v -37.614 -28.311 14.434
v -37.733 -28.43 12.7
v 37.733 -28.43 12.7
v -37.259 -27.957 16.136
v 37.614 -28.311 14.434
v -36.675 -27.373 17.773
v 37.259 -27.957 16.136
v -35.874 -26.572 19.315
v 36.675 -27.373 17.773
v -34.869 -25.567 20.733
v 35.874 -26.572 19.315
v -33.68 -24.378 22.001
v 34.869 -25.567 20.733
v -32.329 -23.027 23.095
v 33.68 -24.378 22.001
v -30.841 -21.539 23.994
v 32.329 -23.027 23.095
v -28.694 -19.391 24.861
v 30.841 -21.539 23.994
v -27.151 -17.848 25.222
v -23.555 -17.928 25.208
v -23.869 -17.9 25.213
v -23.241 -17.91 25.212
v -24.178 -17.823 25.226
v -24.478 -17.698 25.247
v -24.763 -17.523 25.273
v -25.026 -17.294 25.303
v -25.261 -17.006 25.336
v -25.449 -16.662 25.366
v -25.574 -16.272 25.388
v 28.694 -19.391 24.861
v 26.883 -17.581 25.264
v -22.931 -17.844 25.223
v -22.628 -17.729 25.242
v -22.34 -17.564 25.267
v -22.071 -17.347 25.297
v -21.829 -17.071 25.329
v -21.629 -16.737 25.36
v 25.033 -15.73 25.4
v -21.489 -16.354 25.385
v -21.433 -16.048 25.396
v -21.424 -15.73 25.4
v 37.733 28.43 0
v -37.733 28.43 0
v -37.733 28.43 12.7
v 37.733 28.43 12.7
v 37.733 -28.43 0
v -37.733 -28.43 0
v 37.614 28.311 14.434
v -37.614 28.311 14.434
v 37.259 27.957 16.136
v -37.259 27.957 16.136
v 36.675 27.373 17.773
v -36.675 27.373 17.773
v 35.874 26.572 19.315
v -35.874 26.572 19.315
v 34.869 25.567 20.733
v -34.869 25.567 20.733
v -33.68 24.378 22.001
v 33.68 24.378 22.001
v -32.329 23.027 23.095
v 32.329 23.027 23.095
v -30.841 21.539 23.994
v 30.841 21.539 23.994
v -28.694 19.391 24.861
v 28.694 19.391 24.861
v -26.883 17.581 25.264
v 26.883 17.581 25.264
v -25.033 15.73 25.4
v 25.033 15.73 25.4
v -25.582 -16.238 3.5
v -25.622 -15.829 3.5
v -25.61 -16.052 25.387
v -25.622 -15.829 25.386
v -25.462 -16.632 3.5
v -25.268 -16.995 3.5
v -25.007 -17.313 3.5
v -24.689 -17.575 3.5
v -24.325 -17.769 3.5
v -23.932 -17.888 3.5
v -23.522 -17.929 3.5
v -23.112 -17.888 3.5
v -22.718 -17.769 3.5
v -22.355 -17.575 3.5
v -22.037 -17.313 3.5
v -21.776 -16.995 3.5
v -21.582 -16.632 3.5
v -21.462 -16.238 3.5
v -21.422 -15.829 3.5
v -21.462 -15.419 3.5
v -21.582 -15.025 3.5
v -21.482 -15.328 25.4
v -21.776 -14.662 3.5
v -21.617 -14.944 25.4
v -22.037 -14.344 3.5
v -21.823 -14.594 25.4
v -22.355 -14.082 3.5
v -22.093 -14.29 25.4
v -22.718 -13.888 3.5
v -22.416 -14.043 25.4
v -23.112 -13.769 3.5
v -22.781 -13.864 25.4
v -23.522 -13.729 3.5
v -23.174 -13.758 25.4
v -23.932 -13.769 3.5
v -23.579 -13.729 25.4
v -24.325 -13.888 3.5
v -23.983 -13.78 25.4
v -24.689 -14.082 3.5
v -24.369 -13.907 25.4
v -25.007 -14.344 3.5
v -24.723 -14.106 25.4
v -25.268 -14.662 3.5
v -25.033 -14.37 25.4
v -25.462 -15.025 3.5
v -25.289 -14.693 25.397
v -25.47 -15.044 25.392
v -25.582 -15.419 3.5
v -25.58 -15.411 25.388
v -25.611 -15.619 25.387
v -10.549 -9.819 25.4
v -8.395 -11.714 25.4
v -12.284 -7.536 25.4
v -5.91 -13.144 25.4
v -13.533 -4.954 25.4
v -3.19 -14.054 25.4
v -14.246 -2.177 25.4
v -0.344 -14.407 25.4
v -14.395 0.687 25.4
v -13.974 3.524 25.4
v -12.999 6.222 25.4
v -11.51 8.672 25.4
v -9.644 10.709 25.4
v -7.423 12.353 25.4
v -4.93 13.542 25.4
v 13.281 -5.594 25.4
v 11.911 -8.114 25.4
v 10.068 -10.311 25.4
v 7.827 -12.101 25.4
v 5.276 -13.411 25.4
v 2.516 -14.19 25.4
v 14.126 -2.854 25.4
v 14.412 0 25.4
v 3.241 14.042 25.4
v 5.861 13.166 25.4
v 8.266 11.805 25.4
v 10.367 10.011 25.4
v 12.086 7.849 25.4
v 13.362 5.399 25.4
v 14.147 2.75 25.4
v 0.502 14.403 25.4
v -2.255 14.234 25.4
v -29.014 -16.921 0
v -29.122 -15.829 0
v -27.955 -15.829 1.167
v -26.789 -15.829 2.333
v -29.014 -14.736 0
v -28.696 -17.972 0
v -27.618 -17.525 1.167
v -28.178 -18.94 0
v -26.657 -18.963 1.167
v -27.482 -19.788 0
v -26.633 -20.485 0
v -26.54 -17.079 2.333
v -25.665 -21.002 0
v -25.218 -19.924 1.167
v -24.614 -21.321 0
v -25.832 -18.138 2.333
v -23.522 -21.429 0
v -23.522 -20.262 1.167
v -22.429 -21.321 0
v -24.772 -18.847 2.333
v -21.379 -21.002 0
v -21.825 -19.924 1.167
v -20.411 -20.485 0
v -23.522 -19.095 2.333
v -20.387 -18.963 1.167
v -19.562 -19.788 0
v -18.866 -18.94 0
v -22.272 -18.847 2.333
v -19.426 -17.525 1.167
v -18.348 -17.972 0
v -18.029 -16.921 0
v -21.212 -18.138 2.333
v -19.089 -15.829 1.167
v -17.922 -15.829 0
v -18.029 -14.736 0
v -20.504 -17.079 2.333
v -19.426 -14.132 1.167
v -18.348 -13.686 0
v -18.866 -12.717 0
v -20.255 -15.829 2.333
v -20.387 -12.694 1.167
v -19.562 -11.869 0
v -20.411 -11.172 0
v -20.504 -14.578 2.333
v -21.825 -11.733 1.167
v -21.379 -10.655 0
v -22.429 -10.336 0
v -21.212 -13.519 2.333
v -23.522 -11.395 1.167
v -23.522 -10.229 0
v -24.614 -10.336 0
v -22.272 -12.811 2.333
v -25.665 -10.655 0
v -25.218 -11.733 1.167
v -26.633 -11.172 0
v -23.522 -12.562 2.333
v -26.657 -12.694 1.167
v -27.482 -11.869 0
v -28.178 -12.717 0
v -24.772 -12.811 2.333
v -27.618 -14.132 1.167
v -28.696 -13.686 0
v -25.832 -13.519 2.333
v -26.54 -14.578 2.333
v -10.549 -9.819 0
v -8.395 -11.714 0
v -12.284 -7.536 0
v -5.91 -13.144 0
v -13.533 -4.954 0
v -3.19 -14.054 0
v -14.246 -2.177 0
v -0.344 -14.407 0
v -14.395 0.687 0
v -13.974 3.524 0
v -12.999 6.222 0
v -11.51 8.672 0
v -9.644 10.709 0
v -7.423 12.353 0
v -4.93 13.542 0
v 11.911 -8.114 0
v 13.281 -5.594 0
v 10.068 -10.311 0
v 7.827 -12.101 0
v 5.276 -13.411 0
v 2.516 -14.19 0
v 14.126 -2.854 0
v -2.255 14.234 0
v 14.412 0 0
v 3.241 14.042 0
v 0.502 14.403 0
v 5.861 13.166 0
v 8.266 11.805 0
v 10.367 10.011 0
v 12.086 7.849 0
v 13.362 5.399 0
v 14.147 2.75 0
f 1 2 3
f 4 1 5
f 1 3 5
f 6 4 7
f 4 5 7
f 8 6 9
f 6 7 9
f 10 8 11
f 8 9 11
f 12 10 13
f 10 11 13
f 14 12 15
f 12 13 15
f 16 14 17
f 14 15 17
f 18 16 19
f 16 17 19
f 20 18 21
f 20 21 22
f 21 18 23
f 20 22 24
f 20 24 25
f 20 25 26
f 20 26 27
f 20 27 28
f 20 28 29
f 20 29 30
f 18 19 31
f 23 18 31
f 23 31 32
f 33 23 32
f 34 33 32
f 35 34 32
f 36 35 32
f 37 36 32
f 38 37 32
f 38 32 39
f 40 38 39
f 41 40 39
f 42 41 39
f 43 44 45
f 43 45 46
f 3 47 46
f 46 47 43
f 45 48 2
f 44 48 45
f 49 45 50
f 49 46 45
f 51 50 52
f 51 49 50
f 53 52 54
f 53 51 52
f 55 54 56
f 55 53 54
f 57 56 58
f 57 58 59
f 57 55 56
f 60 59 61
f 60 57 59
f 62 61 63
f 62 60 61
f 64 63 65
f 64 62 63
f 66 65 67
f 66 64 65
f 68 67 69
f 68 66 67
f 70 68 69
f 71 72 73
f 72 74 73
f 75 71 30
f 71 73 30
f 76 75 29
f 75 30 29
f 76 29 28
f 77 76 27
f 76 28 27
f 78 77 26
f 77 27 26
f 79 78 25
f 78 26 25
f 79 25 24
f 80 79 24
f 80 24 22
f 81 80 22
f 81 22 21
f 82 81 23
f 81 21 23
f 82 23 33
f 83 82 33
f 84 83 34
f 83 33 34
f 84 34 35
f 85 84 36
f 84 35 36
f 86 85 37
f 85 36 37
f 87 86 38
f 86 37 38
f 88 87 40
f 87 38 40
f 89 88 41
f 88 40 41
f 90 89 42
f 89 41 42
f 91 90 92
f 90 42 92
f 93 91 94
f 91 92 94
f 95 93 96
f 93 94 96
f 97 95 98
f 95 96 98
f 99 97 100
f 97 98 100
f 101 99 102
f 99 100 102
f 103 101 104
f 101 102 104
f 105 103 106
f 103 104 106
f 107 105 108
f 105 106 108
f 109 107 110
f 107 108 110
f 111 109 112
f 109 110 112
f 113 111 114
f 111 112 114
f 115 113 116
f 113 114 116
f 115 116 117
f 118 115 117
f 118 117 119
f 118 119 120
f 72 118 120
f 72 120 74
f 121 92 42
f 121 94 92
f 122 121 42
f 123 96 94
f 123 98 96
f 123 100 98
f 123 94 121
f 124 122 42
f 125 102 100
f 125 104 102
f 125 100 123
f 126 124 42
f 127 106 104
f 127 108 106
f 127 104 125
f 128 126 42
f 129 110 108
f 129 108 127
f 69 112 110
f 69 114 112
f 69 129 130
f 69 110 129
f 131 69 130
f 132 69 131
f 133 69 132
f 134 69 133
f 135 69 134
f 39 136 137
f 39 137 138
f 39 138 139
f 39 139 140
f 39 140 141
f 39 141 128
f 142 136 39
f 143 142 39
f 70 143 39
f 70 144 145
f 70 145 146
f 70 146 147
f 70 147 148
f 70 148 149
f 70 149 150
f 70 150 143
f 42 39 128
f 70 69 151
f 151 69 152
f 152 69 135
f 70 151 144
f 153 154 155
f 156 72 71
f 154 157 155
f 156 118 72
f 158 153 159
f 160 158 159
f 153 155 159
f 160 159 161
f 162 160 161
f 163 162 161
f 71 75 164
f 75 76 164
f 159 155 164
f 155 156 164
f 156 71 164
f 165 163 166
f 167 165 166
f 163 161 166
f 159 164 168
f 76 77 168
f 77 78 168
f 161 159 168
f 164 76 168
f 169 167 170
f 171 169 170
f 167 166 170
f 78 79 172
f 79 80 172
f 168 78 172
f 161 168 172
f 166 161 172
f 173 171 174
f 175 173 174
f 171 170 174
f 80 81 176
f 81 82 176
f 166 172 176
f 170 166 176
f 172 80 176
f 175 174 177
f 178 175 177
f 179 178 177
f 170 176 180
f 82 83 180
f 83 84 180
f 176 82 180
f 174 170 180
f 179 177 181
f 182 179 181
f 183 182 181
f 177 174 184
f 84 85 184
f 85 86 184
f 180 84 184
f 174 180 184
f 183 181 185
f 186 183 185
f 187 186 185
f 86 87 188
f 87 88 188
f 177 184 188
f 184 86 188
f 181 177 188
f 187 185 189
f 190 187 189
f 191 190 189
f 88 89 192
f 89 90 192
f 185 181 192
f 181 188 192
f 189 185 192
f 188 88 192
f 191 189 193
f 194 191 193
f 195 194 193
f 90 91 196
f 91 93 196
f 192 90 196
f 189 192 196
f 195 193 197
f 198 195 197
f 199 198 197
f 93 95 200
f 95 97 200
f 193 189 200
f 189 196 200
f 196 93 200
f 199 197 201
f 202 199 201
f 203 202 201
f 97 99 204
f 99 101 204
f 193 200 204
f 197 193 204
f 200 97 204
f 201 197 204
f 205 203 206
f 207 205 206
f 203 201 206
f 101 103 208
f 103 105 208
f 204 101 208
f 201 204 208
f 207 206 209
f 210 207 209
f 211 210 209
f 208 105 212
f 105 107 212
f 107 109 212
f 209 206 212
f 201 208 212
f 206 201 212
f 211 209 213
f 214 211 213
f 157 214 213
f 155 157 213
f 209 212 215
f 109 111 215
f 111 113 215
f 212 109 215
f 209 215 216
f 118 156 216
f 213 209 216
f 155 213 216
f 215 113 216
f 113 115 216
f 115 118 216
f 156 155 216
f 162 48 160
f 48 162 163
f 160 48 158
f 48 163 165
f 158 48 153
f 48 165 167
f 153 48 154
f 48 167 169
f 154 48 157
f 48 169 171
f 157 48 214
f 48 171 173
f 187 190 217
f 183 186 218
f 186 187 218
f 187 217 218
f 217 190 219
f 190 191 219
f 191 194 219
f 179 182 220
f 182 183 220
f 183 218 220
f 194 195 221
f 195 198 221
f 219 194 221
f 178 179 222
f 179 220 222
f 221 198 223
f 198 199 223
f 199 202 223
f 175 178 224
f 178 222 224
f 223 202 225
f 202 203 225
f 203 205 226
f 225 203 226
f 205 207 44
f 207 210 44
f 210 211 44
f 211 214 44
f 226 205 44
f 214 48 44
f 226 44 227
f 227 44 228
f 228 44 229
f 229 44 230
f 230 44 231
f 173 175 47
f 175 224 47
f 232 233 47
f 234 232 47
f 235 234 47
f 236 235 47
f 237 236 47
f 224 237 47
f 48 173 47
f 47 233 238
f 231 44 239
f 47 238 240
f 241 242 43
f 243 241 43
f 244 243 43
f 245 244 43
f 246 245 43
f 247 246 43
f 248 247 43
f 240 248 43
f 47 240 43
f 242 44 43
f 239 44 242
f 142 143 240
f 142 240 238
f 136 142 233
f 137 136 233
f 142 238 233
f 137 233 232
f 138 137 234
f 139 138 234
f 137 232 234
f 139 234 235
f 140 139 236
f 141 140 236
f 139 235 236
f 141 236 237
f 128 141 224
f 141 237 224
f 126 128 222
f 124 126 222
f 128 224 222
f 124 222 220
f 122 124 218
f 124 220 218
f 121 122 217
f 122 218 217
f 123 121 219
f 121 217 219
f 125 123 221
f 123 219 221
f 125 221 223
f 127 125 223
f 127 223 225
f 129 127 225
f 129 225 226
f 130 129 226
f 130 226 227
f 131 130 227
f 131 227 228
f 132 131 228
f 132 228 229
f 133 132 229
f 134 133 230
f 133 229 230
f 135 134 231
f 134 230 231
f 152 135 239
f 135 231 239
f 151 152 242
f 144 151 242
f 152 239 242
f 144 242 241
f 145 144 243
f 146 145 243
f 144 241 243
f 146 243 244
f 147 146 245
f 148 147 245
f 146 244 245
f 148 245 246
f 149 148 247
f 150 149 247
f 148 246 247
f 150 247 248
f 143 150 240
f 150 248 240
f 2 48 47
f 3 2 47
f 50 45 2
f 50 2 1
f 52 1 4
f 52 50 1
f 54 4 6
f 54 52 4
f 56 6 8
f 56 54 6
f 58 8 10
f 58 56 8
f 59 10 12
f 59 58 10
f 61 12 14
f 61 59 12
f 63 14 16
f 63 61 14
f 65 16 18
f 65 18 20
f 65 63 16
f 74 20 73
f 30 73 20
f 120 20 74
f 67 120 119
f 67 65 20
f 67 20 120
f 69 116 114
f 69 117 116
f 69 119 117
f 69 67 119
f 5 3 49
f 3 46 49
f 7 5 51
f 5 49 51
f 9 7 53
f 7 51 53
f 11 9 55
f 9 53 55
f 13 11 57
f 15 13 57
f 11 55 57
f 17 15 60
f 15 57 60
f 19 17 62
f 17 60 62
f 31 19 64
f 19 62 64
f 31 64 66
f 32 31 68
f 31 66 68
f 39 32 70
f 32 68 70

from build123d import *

# Parameters (mm, degrees)
F0_W           = 75.4651799798
F0_H           = 56.8607151508
F1_DEPTH       = 25.4
F2_R           = 12.7
F4_D           = 4.2
F4_CSINK_D     = 11.2
F4_CSINK_ANGLE = 90


with BuildPart() as f1:
    # F0 (on Top) → F1 (new body)
    with BuildSketch(Plane.XY):
        Rectangle(F0_W, F0_H)
        with BuildLine():
            ThreePointArc((14.4115838808, 0), (-4.5724943597, -13.6669691331), (-11.5100700927, 8.6724873257))
            ThreePointArc((-11.5100700927, 8.6724873257), (4.5724943597, 13.6669691331), (14.4115838808, 0))
        make_face(mode=Mode.SUBTRACT)
    extrude(amount=F1_DEPTH)

    # F2
    f2_edges = [f1.edges().sort_by_distance(p)[0] for p in [
        (0, -28.430358, 25.4),
        (-37.73259, 0, 25.4),
        (0, 28.430358, 25.4),
        (37.73259, 0, 25.4),
    ]]
    fillet(f2_edges, radius=F2_R)

    # F4 (through all)
    with Locations(Plane(origin=(0, 0, 0), x_dir=(1, 0, 0), z_dir=(0, 0, -1))):
        with Locations((-23.5218573362, 15.828538686)):
            CounterSinkHole(F4_D / 2, F4_CSINK_D / 2, counter_sink_angle=F4_CSINK_ANGLE)


solid = f1.part
